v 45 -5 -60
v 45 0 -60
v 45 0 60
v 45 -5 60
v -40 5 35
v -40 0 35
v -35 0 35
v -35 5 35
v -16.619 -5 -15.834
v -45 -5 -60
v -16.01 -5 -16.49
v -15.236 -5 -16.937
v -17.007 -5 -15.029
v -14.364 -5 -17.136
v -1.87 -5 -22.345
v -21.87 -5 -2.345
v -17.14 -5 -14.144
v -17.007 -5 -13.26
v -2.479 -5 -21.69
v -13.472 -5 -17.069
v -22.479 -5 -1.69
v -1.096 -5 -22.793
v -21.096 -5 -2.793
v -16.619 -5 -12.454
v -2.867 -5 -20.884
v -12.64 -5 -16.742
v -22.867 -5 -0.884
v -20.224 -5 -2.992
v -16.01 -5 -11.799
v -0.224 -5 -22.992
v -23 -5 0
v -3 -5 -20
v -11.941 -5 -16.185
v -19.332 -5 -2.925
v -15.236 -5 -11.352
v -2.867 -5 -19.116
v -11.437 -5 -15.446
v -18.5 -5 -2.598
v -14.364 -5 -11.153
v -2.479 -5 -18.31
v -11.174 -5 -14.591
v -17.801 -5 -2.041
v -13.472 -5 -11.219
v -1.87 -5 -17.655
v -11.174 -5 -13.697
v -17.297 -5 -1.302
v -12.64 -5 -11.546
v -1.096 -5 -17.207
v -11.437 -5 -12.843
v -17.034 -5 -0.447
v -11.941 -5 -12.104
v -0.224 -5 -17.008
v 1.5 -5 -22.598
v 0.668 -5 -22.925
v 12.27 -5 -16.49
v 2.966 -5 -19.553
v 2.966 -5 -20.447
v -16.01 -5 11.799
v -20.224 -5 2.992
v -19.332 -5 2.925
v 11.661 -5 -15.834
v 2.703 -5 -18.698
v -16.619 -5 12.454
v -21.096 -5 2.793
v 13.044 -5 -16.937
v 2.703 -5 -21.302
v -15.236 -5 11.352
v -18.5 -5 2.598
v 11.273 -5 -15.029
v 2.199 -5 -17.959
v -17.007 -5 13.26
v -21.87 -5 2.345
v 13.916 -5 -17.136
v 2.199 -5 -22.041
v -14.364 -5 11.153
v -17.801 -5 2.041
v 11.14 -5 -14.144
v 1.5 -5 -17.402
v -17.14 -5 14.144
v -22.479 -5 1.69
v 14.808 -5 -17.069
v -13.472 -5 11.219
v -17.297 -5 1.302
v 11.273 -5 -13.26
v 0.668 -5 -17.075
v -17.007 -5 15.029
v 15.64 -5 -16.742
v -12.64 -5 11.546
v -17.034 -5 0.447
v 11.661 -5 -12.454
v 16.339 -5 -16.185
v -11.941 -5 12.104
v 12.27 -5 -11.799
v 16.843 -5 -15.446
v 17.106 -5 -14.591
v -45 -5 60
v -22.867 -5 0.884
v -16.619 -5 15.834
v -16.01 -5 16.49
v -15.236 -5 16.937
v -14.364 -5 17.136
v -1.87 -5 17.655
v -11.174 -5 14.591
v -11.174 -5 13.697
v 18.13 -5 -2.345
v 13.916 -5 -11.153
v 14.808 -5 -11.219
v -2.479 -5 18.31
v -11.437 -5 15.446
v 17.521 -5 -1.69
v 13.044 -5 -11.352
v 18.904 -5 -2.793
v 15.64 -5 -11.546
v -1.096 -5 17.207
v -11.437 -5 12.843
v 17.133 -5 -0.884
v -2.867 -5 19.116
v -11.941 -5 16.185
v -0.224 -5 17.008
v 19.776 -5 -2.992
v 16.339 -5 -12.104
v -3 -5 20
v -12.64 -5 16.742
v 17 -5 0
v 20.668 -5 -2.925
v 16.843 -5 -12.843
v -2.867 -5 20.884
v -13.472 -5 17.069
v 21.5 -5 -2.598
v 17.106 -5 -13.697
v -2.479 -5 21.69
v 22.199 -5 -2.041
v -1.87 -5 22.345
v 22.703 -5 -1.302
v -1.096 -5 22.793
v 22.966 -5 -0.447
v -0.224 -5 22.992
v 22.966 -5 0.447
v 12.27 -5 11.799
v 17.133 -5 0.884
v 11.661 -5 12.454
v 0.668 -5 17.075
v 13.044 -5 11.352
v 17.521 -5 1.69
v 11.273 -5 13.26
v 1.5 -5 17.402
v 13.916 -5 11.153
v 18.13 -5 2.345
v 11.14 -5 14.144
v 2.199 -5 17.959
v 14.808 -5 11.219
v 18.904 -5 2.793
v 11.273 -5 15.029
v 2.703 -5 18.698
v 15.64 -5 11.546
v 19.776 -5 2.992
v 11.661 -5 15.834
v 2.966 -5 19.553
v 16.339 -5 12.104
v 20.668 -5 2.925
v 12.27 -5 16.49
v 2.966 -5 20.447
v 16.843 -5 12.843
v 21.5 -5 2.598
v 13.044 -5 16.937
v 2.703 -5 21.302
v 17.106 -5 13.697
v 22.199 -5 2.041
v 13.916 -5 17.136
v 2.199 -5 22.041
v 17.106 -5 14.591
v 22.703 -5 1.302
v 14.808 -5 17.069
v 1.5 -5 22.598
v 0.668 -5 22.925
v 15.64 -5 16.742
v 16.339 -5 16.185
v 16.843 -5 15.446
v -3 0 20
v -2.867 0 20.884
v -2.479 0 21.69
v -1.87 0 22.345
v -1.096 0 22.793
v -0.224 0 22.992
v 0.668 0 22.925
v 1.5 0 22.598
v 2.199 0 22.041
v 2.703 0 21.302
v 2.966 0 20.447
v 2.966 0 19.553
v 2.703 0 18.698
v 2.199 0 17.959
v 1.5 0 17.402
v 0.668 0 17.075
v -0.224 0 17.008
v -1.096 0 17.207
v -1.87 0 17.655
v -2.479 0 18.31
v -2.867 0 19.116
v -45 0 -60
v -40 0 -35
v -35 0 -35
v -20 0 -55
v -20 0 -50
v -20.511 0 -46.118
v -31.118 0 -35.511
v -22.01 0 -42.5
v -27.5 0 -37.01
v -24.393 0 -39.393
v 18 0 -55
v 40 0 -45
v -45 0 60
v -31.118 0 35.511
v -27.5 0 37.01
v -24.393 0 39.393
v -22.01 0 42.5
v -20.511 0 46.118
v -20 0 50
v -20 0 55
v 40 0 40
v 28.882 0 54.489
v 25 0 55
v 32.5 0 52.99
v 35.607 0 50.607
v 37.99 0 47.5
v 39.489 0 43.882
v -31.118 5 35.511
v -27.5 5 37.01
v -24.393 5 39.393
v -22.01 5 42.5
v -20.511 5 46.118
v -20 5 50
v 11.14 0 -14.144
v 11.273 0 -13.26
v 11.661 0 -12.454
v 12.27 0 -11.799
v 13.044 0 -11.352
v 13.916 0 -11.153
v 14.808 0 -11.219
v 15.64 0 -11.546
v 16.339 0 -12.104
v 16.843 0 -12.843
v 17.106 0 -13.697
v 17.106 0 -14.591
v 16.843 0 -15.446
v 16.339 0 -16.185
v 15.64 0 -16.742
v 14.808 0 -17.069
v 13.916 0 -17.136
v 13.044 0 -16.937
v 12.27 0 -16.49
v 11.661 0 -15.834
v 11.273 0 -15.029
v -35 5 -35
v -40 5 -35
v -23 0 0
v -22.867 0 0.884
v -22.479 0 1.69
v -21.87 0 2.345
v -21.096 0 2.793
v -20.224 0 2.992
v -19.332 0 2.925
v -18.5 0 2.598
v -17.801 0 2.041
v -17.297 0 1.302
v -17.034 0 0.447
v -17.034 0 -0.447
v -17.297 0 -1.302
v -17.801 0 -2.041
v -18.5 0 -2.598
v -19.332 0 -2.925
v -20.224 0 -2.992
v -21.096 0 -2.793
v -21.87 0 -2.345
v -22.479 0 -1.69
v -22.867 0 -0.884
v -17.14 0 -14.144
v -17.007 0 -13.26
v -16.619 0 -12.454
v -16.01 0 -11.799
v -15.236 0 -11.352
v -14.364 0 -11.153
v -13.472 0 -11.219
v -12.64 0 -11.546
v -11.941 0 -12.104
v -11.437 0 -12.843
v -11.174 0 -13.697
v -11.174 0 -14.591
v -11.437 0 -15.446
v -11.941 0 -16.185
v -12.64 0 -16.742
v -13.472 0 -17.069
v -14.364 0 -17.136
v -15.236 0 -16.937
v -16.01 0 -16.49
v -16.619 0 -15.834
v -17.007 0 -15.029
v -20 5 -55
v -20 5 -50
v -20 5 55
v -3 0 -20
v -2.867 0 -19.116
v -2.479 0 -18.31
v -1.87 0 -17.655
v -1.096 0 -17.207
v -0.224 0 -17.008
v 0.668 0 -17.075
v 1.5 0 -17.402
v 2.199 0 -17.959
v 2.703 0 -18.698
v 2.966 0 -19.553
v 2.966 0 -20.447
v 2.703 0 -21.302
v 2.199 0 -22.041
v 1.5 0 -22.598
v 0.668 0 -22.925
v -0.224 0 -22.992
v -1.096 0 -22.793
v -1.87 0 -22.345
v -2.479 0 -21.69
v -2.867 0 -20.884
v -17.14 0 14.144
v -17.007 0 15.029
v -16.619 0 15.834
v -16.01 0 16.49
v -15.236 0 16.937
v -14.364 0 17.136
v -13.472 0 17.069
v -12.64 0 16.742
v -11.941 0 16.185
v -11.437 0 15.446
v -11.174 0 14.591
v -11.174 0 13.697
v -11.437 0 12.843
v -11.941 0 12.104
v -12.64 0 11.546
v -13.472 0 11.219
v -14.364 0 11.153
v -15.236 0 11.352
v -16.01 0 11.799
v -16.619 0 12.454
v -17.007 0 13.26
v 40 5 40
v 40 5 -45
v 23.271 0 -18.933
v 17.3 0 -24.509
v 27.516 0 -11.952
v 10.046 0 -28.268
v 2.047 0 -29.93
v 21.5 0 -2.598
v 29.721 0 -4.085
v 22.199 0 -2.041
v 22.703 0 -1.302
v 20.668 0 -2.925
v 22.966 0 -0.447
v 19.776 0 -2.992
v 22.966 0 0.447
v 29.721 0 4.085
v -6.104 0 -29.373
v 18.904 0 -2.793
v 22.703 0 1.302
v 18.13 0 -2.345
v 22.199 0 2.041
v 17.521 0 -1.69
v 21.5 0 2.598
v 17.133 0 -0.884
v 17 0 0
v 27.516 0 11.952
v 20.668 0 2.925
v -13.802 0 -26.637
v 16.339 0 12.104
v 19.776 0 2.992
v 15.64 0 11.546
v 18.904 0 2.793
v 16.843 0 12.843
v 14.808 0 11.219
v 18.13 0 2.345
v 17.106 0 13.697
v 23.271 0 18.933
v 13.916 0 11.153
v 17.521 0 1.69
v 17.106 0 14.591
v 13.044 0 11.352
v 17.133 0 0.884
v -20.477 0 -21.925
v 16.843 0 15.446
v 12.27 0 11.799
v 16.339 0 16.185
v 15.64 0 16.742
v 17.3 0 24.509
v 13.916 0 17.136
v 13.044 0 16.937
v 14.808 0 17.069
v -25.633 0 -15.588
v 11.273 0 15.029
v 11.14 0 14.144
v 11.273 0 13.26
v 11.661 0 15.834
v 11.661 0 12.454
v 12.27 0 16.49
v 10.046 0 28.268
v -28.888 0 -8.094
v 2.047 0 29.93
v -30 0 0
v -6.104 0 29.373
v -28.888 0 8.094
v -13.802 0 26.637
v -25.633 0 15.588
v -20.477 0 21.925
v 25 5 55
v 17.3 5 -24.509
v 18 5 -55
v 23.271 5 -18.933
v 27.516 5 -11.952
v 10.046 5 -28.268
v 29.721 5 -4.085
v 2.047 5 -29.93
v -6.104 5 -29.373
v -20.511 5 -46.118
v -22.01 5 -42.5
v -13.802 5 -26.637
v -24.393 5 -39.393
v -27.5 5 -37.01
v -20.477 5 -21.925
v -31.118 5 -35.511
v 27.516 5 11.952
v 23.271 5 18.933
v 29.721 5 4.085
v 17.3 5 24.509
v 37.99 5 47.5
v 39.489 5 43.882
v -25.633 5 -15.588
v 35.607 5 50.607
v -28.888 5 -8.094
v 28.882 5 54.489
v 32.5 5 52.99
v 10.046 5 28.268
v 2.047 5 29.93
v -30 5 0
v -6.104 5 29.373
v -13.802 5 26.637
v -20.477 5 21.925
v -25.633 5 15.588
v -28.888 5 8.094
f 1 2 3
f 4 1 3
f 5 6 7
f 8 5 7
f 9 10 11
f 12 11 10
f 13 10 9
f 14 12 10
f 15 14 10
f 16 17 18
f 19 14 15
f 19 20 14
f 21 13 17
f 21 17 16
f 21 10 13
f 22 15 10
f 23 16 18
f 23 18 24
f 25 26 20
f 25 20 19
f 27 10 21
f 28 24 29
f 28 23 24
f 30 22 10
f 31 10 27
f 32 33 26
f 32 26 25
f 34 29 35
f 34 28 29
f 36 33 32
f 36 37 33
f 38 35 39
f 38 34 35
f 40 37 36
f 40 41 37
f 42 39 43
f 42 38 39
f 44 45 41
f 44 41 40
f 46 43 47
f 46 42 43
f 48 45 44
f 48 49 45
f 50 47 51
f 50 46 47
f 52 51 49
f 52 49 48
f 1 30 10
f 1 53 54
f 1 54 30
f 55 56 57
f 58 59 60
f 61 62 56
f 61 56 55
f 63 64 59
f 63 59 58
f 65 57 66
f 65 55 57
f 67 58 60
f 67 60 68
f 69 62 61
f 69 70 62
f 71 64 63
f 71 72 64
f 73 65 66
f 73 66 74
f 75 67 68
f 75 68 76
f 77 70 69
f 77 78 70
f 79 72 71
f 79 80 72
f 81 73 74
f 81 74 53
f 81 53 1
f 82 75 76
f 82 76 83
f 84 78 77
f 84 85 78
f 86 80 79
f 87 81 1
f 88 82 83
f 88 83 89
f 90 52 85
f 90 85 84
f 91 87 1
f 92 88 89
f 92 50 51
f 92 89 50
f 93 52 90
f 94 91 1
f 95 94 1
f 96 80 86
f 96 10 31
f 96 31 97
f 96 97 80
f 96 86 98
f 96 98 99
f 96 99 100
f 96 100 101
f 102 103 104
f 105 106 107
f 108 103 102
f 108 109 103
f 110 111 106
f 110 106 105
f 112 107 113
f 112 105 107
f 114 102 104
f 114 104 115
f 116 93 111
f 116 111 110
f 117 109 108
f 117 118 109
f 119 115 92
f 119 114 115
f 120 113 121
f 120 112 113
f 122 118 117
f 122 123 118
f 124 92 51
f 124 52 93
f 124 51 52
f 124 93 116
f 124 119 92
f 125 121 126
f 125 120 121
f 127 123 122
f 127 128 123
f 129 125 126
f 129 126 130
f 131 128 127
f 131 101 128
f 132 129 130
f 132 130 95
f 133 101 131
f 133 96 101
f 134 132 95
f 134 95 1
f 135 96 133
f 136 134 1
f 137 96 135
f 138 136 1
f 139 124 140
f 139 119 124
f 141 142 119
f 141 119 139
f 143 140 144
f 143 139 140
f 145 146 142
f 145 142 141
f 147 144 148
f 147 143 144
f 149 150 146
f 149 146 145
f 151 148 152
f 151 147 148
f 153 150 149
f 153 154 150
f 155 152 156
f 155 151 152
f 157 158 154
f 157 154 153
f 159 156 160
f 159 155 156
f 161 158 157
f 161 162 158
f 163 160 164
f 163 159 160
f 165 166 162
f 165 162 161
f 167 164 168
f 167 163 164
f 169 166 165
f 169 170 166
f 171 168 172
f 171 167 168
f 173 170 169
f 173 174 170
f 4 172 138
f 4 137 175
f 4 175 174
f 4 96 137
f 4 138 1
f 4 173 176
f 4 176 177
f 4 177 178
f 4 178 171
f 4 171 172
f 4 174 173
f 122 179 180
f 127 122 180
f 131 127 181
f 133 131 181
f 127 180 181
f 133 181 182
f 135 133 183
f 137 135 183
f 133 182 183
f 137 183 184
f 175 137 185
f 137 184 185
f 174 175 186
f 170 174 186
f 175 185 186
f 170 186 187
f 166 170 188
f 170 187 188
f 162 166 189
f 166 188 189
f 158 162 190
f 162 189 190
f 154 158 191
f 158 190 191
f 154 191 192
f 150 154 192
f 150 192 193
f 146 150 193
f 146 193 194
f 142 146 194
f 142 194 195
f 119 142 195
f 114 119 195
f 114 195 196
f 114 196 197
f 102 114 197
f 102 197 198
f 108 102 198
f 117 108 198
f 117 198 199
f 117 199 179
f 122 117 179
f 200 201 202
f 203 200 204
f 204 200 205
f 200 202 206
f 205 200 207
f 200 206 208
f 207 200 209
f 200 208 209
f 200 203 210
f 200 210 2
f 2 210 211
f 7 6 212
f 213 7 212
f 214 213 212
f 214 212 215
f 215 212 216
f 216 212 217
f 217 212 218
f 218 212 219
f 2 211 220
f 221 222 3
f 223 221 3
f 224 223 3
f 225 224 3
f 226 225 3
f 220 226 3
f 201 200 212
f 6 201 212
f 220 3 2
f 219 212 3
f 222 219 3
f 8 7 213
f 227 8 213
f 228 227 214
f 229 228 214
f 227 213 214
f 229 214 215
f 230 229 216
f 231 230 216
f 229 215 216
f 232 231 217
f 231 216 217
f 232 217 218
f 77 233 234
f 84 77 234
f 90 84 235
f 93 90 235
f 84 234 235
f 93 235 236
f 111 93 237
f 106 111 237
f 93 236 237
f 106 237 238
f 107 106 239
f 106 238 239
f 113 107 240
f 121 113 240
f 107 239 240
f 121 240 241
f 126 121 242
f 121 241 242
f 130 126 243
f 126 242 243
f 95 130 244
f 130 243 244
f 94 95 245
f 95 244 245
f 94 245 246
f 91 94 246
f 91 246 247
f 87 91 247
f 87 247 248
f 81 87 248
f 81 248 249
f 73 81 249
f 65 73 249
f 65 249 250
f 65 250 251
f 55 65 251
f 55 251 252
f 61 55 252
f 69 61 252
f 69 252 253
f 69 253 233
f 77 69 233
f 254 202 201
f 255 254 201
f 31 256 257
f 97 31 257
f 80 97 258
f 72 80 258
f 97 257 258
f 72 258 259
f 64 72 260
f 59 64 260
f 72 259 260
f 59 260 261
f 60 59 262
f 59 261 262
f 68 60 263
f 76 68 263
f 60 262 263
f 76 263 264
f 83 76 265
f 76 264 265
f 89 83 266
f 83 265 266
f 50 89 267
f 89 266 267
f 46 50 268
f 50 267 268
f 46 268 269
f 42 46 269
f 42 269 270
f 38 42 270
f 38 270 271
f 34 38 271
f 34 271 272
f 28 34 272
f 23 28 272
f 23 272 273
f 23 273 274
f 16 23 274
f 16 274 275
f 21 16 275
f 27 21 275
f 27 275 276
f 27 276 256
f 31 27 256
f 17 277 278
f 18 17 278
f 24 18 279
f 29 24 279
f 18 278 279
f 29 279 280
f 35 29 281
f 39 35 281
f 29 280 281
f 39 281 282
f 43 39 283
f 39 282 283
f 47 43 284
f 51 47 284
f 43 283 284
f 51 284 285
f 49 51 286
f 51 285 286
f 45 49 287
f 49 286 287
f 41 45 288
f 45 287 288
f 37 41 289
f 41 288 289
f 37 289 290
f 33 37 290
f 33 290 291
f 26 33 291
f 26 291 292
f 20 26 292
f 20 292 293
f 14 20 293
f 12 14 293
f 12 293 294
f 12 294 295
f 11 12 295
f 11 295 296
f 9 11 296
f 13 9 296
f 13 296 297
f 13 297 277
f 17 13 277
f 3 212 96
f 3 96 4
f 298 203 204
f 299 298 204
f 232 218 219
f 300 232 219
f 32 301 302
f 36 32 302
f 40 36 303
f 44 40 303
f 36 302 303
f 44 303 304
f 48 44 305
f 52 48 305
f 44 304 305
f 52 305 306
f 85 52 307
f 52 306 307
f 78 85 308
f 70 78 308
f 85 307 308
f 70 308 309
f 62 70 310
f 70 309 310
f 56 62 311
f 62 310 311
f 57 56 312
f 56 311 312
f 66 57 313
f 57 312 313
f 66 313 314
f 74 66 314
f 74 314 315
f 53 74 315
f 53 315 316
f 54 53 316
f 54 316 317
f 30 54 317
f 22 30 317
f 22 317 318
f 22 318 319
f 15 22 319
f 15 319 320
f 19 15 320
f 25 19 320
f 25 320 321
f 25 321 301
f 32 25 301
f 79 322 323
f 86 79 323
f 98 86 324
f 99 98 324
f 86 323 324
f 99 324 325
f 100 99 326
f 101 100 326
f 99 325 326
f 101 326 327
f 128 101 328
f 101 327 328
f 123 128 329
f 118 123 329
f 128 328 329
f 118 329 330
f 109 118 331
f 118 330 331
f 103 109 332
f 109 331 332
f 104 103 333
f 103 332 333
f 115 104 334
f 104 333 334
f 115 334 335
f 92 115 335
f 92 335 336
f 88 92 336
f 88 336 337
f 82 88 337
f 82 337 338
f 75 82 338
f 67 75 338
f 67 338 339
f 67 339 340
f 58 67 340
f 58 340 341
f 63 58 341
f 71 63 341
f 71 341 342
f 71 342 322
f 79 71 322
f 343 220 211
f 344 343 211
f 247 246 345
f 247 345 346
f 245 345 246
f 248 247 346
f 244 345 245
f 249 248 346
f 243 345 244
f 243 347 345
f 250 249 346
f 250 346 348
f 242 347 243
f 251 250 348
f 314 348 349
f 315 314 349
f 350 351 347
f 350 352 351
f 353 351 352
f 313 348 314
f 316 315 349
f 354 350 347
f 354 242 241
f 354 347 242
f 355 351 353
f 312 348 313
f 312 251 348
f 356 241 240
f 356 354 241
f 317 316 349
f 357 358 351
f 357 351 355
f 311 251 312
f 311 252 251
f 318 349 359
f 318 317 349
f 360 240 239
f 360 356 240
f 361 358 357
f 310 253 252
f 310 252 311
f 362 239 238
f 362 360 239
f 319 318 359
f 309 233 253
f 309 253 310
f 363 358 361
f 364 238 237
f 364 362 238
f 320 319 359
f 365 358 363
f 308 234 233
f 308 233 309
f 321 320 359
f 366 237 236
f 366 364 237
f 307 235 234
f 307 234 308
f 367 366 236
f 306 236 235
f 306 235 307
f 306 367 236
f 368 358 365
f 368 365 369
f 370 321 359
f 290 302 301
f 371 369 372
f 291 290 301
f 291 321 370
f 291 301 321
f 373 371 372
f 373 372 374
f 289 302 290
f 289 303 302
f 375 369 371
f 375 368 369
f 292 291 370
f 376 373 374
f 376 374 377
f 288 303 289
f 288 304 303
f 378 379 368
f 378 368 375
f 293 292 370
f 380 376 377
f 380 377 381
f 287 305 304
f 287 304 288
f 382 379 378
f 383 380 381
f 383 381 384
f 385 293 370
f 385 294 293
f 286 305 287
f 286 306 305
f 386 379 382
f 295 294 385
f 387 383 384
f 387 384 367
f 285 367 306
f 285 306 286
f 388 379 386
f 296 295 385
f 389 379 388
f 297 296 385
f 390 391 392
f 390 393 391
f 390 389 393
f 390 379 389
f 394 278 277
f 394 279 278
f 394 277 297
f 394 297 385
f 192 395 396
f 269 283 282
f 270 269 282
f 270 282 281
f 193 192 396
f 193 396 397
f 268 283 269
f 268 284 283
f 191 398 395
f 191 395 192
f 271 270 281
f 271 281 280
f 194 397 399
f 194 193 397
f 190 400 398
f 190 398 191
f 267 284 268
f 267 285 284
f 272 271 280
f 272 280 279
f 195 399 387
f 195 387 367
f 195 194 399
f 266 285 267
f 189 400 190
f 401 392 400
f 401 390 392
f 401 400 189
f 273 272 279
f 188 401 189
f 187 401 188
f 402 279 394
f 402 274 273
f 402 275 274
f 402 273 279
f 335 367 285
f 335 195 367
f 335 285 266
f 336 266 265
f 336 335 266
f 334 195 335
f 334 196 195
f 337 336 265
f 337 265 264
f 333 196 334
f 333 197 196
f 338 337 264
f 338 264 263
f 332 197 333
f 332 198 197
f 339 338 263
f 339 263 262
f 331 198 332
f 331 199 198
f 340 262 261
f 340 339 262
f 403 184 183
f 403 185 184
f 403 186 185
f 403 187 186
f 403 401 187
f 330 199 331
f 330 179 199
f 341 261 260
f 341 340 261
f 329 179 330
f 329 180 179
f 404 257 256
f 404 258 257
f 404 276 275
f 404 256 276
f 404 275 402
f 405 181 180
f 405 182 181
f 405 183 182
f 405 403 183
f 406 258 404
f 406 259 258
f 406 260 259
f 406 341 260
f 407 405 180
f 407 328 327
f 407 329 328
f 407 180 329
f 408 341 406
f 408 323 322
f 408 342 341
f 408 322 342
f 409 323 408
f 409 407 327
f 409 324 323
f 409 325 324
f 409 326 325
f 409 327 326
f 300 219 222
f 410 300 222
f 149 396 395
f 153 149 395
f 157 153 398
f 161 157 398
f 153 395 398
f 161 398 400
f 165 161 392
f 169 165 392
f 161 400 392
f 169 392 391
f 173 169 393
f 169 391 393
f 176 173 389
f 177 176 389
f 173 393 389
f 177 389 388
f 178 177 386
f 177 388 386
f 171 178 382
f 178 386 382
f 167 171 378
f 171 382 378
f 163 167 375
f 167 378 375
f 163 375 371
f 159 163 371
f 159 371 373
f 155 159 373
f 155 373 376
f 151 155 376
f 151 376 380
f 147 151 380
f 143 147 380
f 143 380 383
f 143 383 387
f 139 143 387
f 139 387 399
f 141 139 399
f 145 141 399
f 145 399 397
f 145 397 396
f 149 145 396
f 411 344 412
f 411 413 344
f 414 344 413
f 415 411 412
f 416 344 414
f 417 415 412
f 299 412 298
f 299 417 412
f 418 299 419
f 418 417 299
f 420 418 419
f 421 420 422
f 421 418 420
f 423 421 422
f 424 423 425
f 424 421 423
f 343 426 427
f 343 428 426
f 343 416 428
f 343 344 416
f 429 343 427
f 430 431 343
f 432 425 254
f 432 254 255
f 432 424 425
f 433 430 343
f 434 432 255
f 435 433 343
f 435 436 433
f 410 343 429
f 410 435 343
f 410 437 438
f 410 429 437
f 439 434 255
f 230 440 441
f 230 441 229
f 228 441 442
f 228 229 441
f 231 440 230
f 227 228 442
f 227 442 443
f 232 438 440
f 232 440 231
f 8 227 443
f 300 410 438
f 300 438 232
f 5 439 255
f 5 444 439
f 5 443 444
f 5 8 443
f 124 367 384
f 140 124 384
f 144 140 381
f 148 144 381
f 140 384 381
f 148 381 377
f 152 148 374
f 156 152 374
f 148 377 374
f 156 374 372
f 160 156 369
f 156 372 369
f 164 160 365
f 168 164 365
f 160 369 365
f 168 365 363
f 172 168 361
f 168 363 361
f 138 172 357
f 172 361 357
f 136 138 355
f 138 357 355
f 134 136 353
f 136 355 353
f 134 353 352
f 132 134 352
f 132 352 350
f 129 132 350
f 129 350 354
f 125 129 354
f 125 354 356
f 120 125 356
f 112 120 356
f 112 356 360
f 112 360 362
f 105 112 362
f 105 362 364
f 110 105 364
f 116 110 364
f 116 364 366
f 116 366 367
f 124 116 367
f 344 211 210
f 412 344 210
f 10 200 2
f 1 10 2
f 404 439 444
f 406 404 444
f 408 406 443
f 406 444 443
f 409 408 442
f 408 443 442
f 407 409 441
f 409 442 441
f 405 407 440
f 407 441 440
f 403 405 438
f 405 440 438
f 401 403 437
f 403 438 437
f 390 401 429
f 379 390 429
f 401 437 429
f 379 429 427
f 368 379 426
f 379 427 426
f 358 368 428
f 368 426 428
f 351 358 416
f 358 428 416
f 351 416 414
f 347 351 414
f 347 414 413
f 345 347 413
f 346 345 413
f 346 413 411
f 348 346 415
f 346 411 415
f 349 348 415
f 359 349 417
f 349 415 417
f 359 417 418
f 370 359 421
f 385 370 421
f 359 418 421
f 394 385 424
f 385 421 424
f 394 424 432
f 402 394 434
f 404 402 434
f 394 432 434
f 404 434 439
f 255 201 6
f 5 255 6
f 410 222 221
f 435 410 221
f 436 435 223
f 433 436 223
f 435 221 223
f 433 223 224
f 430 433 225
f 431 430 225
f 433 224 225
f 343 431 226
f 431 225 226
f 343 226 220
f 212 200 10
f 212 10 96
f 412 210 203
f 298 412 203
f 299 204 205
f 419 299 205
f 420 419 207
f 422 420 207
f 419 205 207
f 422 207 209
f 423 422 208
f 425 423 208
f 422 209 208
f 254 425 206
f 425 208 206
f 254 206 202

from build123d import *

# Parameters (mm, degrees)
F0_W     = 90
F0_H     = 120
F1_DEPTH = 5
F3_DEPTH = 5
F4_R     = 30
F4_R_2   = 3
F5_DEPTH = 5
F6_DEPTH = 25


with BuildPart() as f1:
    # F0 (on Front) → F1 (new body)
    with BuildSketch(Plane.XZ):
        Rectangle(F0_W, F0_H)
    extrude(amount=F1_DEPTH)

    # F2 (on face) → F3 (join)
    with BuildSketch(Plane(origin=(0, 0, 0), x_dir=(-1, 0, 0), z_dir=(0, 1, 0))):
        with BuildLine():
            Line((-40, -45), (-18, -55))
            Line((-18, -55), (20, -55))
            Line((20, -55), (20, -50))
            ThreePointArc((20, -50), (24.393398, -39.393398), (35, -35))
            Line((35, -35), (40, -35))
            Line((40, -35), (40, 35))
            Line((40, 35), (35, 35))
            ThreePointArc((35, 35), (24.393398, 39.393398), (20, 50))
            Line((20, 50), (20, 55))
            Line((20, 55), (-25, 55))
            ThreePointArc((-25, 55), (-35.606602, 50.606602), (-40, 40))
            Line((-40, 40), (-40, -45))
        make_face()
    extrude(amount=F3_DEPTH)

    # F4 (on face) → F5 (cut)
    with BuildSketch(Plane(origin=(0, 5, 0), x_dir=(-1, 0, 0), z_dir=(0, 1, 0))):
        Circle(F4_R)
        with Locations((-14.14, -14.144271)):
            Circle(F4_R_2, mode=Mode.SUBTRACT)
        with Locations((0, -20)):
            Circle(F4_R_2, mode=Mode.SUBTRACT)
        with Locations((14.14, -14.144271)):
            Circle(F4_R_2, mode=Mode.SUBTRACT)
        with Locations((-20, 0)):
            Circle(F4_R_2, mode=Mode.SUBTRACT)
        with Locations((-14.14, 14.144271)):
            Circle(F4_R_2, mode=Mode.SUBTRACT)
        with Locations((0, 20)):
            Circle(F4_R_2, mode=Mode.SUBTRACT)
        with Locations((14.14, 14.144271)):
            Circle(F4_R_2, mode=Mode.SUBTRACT)
        with Locations((20, 0)):
            Circle(F4_R_2, mode=Mode.SUBTRACT)
    extrude(amount=-F5_DEPTH, mode=Mode.SUBTRACT)

    # F4 (on face) → F6 (cut)
    with BuildSketch(Plane(origin=(0, 5, 0), x_dir=(-1, 0, 0), z_dir=(0, 1, 0))):
        with Locations((-14.14, -14.144271)):
            Circle(F4_R_2)
        with Locations((-20, 0)):
            Circle(F4_R_2)
        with Locations((-14.14, 14.144271)):
            Circle(F4_R_2)
        with Locations((0, 20)):
            Circle(F4_R_2)
        with Locations((14.14, 14.144271)):
            Circle(F4_R_2)
        with Locations((20, 0)):
            Circle(F4_R_2)
        with Locations((14.14, -14.144271)):
            Circle(F4_R_2)
        with Locations((0, -20)):
            Circle(F4_R_2)
    extrude(amount=-F6_DEPTH, mode=Mode.SUBTRACT)


solid = f1.part
